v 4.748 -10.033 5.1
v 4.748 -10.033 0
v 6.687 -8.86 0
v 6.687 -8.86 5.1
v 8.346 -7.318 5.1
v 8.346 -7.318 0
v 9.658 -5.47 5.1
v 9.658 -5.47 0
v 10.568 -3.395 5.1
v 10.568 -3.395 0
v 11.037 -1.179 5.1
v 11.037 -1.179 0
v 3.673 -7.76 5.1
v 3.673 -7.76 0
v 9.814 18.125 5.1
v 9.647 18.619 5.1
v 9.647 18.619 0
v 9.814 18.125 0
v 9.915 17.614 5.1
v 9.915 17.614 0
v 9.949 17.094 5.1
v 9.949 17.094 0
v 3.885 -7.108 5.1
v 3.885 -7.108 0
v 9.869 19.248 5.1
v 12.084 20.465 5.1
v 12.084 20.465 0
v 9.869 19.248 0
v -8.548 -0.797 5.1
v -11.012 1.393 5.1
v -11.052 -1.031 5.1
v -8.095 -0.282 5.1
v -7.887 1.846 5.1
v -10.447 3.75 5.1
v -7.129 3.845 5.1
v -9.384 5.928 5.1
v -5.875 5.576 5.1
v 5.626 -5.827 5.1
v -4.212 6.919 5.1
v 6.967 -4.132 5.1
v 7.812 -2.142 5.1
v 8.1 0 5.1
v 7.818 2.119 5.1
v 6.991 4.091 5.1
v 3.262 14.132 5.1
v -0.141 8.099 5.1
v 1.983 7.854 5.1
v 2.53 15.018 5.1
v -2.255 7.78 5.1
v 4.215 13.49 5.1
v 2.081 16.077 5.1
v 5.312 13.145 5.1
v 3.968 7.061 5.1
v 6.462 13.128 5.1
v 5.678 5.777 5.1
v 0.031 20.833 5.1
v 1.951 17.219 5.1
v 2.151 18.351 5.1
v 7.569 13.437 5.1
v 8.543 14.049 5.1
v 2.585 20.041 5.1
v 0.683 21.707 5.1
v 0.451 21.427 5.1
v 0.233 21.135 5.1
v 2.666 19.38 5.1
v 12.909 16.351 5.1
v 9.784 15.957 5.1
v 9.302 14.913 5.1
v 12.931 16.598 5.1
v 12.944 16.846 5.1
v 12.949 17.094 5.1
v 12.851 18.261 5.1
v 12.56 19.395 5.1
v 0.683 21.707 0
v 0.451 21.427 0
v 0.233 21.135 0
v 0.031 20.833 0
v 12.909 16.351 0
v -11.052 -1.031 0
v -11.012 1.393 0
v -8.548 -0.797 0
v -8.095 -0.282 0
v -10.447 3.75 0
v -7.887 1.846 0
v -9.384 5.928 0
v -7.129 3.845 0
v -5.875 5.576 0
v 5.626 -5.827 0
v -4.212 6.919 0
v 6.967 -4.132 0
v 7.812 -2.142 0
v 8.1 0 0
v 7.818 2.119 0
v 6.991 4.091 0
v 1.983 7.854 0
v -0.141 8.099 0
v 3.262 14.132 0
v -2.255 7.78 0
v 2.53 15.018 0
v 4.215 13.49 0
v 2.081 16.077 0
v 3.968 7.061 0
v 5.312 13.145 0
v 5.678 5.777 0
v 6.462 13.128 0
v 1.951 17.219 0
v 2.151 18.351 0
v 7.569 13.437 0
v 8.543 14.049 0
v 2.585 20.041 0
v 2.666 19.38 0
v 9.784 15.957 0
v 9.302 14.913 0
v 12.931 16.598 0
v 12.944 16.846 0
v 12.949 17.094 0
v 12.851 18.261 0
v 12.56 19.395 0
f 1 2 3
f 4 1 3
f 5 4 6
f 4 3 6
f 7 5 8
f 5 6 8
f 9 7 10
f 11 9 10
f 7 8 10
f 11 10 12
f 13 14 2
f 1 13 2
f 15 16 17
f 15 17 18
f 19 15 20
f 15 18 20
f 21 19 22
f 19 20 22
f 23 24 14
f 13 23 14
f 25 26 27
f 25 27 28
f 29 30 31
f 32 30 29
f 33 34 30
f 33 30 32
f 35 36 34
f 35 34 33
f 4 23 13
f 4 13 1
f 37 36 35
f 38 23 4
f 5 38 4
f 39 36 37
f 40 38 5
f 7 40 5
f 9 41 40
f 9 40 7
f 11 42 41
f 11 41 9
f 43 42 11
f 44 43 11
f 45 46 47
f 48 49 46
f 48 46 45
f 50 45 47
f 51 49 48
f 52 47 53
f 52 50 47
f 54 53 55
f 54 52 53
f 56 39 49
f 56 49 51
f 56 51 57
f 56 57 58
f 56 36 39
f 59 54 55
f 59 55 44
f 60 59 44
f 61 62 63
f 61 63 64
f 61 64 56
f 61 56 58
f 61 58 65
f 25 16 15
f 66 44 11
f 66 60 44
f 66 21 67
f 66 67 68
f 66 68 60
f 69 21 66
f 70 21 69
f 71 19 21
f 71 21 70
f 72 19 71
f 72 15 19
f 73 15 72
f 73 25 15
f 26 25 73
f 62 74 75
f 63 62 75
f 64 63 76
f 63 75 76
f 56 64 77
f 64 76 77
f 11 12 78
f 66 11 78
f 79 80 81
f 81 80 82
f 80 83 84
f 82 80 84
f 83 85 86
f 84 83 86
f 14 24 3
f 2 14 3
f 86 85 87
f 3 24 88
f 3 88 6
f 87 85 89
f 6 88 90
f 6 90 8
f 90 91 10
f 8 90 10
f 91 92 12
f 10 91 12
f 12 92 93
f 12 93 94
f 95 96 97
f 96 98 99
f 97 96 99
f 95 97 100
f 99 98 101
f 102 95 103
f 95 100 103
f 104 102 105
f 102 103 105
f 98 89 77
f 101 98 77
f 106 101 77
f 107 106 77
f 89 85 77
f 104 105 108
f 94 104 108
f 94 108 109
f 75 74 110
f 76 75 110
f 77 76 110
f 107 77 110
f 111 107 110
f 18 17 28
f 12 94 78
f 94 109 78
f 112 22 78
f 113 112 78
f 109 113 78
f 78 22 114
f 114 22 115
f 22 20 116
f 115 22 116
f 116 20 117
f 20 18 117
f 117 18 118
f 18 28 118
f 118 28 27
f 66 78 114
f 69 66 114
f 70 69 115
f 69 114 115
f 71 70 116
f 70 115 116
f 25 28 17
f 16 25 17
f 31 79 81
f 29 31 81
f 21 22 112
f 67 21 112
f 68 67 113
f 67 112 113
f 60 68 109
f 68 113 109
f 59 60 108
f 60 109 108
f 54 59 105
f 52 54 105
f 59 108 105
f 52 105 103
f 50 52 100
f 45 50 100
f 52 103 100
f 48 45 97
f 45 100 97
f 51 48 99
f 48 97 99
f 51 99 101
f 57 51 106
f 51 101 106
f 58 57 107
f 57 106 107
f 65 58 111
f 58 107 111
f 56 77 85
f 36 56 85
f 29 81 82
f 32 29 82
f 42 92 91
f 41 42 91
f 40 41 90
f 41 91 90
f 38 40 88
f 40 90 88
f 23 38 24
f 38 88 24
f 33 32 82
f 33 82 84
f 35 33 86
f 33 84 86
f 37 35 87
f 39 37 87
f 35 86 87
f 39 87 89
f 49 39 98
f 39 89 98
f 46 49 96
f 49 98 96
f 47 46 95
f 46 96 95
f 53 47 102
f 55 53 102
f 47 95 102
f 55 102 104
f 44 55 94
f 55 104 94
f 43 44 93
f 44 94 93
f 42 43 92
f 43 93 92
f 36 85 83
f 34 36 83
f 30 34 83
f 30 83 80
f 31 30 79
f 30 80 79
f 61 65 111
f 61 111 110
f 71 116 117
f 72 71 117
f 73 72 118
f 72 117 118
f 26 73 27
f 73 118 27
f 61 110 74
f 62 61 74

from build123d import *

# Parameters (mm, degrees)
F1_DEPTH    = 5.1
F2_T1_DEPTH = 7.5361277396
F2_T3_DEPTH = 7.6009429286


# Not quite as in the source:
# - a fillet or chamfer that OpenCascade refuses, or shapes differently, is made with other operations: its cross-section is extruded or revolved along the edge and cut away or added


with BuildPart() as f1:
    # F0 (on Top) → F1 (new body)
    with BuildSketch(Plane.XY):
        with BuildLine():
            Line((0.0307608464, 20.8328839523), (-9.3844581437, 5.9280642161))
            ThreePointArc((-9.3844581437, 5.9280642161), (-3.6624820561, 10.4783693955), (3.6482130412, 10.4833459165))
            ThreePointArc((3.6482130412, 10.4833459165), (-0.6590930389, 14.7847915444), (0.0307608464, 20.8328839523))
        make_face()
        with BuildLine():
            ThreePointArc((-8.0650120901, -0.752050521), (-0.3764319792, 8.0912482946), (8.1, 0))
            ThreePointArc((8.1, 0), (6.8438750945, -4.3325943371), (3.465092916, -7.3214159207))
            Line((3.465092916, -7.3214159207), (4.7484606627, -10.0330514468))
            ThreePointArc((4.7484606627, -10.0330514468), (9.0496936401, -6.4275224637), (11.0372396512, -1.1787030508))
            ThreePointArc((11.0372396512, -1.1787030508), (11.084298808, -0.5901863569), (11.1, 0))
            ThreePointArc((11.1, 0), (9.0472417, 6.4309733028), (3.6482130412, 10.4833459165))
            ThreePointArc((3.6482130412, 10.4833459165), (-3.6624820561, 10.4783693955), (-9.3844581437, 5.9280642161))
            ThreePointArc((-9.3844581437, 5.9280642161), (-10.7943717933, 2.586800647), (-11.052053605, -1.030587751))
            Line((-11.052053605, -1.030587751), (-8.0650120901, -0.752050521))
        make_face()
        with BuildLine():
            ThreePointArc((11.1, 0), (11.084298808, -0.5901863569), (11.0372396512, -1.1787030508))
            Line((11.0372396512, -1.1787030508), (12.9093090053, 16.351138829))
            ThreePointArc((12.9093090053, 16.351138829), (9.6953604205, 11.1814335847), (3.6482130412, 10.4833459165))
            ThreePointArc((3.6482130412, 10.4833459165), (9.0472417, 6.4309733028), (11.1, 0))
        make_face()
        with BuildLine():
            ThreePointArc((0.0307608464, 20.8328839523), (-0.6590930389, 14.7847915444), (3.6482130412, 10.4833459165))
            ThreePointArc((3.6482130412, 10.4833459165), (9.6953604205, 11.1814335847), (12.9093090053, 16.351138829))
            ThreePointArc((12.9093090053, 16.351138829), (12.938985951, 16.7222754829), (12.9488876036, 17.0944650773))
            ThreePointArc((12.9488876036, 17.0944650773), (12.7292523894, 18.8341930364), (12.0841294975, 20.4647479889))
            Line((12.0841294975, 20.4647479889), (9.4547401144, 19.0203410268))
            ThreePointArc((9.4547401144, 19.0203410268), (9.8233817669, 18.0885953396), (9.9488876036, 17.0944650773))
            ThreePointArc((9.9488876036, 17.0944650773), (4.5409128854, 13.3504555697), (2.9400840071, 19.730200443))
            Line((2.9400840071, 19.730200443), (0.6834813098, 21.7070019672))
            ThreePointArc((0.6834813098, 21.7070019672), (0.3400665642, 21.282677888), (0.0307608464, 20.8328839523))
        make_face()
    extrude(amount=F1_DEPTH)

    # F2: chamfer of 0.5 on 4 edges, made by hand

    # F2_s2 → F2_t1 (cut)
    with BuildSketch(Plane.XY.offset(-1.2180638698)):
        with BuildLine():
            Line((9.8685498702, 19.2476598469), (9.6470180572, 18.6188768158))
            ThreePointArc((9.6470180572, 18.6188768158), (9.5595268283, 18.8158843724), (9.4547401144, 19.0203410268))
            Line((9.4547401144, 19.0203410268), (9.8685498702, 19.2476598469))
        make_face()
        with BuildLine():
            Line((2.665855064, 19.3795684325), (2.5849429173, 20.0413068015))
            Line((2.5849429173, 20.0413068015), (2.9400840071, 19.730200443))
            ThreePointArc((2.9400840071, 19.730200443), (2.7937225781, 19.5531097571), (2.665855064, 19.3795684325))
        make_face()
    extrude(amount=F2_T1_DEPTH, mode=Mode.SUBTRACT)

    # F2_s4 → F2_t3 (cut)
    with BuildSketch(Plane.XY.offset(-1.2504714643)):
        with BuildLine():
            Line((3.8848953119, -7.1075726106), (3.6727644101, -7.7602062851))
            Line((3.6727644101, -7.7602062851), (3.465092916, -7.3214159207))
            ThreePointArc((3.465092916, -7.3214159207), (3.682856675, -7.2143306489), (3.8848953119, -7.1075726106))
        make_face()
        with BuildLine():
            Line((-8.5483679919, -0.7971227482), (-8.0950937203, -0.2818823506))
            ThreePointArc((-8.0950937203, -0.2818823506), (-8.0839209794, -0.5101192), (-8.0650120901, -0.752050521))
            Line((-8.0650120901, -0.752050521), (-8.5483679919, -0.7971227482))
        make_face()
    extrude(amount=F2_T3_DEPTH, mode=Mode.SUBTRACT)


solid = f1.part
